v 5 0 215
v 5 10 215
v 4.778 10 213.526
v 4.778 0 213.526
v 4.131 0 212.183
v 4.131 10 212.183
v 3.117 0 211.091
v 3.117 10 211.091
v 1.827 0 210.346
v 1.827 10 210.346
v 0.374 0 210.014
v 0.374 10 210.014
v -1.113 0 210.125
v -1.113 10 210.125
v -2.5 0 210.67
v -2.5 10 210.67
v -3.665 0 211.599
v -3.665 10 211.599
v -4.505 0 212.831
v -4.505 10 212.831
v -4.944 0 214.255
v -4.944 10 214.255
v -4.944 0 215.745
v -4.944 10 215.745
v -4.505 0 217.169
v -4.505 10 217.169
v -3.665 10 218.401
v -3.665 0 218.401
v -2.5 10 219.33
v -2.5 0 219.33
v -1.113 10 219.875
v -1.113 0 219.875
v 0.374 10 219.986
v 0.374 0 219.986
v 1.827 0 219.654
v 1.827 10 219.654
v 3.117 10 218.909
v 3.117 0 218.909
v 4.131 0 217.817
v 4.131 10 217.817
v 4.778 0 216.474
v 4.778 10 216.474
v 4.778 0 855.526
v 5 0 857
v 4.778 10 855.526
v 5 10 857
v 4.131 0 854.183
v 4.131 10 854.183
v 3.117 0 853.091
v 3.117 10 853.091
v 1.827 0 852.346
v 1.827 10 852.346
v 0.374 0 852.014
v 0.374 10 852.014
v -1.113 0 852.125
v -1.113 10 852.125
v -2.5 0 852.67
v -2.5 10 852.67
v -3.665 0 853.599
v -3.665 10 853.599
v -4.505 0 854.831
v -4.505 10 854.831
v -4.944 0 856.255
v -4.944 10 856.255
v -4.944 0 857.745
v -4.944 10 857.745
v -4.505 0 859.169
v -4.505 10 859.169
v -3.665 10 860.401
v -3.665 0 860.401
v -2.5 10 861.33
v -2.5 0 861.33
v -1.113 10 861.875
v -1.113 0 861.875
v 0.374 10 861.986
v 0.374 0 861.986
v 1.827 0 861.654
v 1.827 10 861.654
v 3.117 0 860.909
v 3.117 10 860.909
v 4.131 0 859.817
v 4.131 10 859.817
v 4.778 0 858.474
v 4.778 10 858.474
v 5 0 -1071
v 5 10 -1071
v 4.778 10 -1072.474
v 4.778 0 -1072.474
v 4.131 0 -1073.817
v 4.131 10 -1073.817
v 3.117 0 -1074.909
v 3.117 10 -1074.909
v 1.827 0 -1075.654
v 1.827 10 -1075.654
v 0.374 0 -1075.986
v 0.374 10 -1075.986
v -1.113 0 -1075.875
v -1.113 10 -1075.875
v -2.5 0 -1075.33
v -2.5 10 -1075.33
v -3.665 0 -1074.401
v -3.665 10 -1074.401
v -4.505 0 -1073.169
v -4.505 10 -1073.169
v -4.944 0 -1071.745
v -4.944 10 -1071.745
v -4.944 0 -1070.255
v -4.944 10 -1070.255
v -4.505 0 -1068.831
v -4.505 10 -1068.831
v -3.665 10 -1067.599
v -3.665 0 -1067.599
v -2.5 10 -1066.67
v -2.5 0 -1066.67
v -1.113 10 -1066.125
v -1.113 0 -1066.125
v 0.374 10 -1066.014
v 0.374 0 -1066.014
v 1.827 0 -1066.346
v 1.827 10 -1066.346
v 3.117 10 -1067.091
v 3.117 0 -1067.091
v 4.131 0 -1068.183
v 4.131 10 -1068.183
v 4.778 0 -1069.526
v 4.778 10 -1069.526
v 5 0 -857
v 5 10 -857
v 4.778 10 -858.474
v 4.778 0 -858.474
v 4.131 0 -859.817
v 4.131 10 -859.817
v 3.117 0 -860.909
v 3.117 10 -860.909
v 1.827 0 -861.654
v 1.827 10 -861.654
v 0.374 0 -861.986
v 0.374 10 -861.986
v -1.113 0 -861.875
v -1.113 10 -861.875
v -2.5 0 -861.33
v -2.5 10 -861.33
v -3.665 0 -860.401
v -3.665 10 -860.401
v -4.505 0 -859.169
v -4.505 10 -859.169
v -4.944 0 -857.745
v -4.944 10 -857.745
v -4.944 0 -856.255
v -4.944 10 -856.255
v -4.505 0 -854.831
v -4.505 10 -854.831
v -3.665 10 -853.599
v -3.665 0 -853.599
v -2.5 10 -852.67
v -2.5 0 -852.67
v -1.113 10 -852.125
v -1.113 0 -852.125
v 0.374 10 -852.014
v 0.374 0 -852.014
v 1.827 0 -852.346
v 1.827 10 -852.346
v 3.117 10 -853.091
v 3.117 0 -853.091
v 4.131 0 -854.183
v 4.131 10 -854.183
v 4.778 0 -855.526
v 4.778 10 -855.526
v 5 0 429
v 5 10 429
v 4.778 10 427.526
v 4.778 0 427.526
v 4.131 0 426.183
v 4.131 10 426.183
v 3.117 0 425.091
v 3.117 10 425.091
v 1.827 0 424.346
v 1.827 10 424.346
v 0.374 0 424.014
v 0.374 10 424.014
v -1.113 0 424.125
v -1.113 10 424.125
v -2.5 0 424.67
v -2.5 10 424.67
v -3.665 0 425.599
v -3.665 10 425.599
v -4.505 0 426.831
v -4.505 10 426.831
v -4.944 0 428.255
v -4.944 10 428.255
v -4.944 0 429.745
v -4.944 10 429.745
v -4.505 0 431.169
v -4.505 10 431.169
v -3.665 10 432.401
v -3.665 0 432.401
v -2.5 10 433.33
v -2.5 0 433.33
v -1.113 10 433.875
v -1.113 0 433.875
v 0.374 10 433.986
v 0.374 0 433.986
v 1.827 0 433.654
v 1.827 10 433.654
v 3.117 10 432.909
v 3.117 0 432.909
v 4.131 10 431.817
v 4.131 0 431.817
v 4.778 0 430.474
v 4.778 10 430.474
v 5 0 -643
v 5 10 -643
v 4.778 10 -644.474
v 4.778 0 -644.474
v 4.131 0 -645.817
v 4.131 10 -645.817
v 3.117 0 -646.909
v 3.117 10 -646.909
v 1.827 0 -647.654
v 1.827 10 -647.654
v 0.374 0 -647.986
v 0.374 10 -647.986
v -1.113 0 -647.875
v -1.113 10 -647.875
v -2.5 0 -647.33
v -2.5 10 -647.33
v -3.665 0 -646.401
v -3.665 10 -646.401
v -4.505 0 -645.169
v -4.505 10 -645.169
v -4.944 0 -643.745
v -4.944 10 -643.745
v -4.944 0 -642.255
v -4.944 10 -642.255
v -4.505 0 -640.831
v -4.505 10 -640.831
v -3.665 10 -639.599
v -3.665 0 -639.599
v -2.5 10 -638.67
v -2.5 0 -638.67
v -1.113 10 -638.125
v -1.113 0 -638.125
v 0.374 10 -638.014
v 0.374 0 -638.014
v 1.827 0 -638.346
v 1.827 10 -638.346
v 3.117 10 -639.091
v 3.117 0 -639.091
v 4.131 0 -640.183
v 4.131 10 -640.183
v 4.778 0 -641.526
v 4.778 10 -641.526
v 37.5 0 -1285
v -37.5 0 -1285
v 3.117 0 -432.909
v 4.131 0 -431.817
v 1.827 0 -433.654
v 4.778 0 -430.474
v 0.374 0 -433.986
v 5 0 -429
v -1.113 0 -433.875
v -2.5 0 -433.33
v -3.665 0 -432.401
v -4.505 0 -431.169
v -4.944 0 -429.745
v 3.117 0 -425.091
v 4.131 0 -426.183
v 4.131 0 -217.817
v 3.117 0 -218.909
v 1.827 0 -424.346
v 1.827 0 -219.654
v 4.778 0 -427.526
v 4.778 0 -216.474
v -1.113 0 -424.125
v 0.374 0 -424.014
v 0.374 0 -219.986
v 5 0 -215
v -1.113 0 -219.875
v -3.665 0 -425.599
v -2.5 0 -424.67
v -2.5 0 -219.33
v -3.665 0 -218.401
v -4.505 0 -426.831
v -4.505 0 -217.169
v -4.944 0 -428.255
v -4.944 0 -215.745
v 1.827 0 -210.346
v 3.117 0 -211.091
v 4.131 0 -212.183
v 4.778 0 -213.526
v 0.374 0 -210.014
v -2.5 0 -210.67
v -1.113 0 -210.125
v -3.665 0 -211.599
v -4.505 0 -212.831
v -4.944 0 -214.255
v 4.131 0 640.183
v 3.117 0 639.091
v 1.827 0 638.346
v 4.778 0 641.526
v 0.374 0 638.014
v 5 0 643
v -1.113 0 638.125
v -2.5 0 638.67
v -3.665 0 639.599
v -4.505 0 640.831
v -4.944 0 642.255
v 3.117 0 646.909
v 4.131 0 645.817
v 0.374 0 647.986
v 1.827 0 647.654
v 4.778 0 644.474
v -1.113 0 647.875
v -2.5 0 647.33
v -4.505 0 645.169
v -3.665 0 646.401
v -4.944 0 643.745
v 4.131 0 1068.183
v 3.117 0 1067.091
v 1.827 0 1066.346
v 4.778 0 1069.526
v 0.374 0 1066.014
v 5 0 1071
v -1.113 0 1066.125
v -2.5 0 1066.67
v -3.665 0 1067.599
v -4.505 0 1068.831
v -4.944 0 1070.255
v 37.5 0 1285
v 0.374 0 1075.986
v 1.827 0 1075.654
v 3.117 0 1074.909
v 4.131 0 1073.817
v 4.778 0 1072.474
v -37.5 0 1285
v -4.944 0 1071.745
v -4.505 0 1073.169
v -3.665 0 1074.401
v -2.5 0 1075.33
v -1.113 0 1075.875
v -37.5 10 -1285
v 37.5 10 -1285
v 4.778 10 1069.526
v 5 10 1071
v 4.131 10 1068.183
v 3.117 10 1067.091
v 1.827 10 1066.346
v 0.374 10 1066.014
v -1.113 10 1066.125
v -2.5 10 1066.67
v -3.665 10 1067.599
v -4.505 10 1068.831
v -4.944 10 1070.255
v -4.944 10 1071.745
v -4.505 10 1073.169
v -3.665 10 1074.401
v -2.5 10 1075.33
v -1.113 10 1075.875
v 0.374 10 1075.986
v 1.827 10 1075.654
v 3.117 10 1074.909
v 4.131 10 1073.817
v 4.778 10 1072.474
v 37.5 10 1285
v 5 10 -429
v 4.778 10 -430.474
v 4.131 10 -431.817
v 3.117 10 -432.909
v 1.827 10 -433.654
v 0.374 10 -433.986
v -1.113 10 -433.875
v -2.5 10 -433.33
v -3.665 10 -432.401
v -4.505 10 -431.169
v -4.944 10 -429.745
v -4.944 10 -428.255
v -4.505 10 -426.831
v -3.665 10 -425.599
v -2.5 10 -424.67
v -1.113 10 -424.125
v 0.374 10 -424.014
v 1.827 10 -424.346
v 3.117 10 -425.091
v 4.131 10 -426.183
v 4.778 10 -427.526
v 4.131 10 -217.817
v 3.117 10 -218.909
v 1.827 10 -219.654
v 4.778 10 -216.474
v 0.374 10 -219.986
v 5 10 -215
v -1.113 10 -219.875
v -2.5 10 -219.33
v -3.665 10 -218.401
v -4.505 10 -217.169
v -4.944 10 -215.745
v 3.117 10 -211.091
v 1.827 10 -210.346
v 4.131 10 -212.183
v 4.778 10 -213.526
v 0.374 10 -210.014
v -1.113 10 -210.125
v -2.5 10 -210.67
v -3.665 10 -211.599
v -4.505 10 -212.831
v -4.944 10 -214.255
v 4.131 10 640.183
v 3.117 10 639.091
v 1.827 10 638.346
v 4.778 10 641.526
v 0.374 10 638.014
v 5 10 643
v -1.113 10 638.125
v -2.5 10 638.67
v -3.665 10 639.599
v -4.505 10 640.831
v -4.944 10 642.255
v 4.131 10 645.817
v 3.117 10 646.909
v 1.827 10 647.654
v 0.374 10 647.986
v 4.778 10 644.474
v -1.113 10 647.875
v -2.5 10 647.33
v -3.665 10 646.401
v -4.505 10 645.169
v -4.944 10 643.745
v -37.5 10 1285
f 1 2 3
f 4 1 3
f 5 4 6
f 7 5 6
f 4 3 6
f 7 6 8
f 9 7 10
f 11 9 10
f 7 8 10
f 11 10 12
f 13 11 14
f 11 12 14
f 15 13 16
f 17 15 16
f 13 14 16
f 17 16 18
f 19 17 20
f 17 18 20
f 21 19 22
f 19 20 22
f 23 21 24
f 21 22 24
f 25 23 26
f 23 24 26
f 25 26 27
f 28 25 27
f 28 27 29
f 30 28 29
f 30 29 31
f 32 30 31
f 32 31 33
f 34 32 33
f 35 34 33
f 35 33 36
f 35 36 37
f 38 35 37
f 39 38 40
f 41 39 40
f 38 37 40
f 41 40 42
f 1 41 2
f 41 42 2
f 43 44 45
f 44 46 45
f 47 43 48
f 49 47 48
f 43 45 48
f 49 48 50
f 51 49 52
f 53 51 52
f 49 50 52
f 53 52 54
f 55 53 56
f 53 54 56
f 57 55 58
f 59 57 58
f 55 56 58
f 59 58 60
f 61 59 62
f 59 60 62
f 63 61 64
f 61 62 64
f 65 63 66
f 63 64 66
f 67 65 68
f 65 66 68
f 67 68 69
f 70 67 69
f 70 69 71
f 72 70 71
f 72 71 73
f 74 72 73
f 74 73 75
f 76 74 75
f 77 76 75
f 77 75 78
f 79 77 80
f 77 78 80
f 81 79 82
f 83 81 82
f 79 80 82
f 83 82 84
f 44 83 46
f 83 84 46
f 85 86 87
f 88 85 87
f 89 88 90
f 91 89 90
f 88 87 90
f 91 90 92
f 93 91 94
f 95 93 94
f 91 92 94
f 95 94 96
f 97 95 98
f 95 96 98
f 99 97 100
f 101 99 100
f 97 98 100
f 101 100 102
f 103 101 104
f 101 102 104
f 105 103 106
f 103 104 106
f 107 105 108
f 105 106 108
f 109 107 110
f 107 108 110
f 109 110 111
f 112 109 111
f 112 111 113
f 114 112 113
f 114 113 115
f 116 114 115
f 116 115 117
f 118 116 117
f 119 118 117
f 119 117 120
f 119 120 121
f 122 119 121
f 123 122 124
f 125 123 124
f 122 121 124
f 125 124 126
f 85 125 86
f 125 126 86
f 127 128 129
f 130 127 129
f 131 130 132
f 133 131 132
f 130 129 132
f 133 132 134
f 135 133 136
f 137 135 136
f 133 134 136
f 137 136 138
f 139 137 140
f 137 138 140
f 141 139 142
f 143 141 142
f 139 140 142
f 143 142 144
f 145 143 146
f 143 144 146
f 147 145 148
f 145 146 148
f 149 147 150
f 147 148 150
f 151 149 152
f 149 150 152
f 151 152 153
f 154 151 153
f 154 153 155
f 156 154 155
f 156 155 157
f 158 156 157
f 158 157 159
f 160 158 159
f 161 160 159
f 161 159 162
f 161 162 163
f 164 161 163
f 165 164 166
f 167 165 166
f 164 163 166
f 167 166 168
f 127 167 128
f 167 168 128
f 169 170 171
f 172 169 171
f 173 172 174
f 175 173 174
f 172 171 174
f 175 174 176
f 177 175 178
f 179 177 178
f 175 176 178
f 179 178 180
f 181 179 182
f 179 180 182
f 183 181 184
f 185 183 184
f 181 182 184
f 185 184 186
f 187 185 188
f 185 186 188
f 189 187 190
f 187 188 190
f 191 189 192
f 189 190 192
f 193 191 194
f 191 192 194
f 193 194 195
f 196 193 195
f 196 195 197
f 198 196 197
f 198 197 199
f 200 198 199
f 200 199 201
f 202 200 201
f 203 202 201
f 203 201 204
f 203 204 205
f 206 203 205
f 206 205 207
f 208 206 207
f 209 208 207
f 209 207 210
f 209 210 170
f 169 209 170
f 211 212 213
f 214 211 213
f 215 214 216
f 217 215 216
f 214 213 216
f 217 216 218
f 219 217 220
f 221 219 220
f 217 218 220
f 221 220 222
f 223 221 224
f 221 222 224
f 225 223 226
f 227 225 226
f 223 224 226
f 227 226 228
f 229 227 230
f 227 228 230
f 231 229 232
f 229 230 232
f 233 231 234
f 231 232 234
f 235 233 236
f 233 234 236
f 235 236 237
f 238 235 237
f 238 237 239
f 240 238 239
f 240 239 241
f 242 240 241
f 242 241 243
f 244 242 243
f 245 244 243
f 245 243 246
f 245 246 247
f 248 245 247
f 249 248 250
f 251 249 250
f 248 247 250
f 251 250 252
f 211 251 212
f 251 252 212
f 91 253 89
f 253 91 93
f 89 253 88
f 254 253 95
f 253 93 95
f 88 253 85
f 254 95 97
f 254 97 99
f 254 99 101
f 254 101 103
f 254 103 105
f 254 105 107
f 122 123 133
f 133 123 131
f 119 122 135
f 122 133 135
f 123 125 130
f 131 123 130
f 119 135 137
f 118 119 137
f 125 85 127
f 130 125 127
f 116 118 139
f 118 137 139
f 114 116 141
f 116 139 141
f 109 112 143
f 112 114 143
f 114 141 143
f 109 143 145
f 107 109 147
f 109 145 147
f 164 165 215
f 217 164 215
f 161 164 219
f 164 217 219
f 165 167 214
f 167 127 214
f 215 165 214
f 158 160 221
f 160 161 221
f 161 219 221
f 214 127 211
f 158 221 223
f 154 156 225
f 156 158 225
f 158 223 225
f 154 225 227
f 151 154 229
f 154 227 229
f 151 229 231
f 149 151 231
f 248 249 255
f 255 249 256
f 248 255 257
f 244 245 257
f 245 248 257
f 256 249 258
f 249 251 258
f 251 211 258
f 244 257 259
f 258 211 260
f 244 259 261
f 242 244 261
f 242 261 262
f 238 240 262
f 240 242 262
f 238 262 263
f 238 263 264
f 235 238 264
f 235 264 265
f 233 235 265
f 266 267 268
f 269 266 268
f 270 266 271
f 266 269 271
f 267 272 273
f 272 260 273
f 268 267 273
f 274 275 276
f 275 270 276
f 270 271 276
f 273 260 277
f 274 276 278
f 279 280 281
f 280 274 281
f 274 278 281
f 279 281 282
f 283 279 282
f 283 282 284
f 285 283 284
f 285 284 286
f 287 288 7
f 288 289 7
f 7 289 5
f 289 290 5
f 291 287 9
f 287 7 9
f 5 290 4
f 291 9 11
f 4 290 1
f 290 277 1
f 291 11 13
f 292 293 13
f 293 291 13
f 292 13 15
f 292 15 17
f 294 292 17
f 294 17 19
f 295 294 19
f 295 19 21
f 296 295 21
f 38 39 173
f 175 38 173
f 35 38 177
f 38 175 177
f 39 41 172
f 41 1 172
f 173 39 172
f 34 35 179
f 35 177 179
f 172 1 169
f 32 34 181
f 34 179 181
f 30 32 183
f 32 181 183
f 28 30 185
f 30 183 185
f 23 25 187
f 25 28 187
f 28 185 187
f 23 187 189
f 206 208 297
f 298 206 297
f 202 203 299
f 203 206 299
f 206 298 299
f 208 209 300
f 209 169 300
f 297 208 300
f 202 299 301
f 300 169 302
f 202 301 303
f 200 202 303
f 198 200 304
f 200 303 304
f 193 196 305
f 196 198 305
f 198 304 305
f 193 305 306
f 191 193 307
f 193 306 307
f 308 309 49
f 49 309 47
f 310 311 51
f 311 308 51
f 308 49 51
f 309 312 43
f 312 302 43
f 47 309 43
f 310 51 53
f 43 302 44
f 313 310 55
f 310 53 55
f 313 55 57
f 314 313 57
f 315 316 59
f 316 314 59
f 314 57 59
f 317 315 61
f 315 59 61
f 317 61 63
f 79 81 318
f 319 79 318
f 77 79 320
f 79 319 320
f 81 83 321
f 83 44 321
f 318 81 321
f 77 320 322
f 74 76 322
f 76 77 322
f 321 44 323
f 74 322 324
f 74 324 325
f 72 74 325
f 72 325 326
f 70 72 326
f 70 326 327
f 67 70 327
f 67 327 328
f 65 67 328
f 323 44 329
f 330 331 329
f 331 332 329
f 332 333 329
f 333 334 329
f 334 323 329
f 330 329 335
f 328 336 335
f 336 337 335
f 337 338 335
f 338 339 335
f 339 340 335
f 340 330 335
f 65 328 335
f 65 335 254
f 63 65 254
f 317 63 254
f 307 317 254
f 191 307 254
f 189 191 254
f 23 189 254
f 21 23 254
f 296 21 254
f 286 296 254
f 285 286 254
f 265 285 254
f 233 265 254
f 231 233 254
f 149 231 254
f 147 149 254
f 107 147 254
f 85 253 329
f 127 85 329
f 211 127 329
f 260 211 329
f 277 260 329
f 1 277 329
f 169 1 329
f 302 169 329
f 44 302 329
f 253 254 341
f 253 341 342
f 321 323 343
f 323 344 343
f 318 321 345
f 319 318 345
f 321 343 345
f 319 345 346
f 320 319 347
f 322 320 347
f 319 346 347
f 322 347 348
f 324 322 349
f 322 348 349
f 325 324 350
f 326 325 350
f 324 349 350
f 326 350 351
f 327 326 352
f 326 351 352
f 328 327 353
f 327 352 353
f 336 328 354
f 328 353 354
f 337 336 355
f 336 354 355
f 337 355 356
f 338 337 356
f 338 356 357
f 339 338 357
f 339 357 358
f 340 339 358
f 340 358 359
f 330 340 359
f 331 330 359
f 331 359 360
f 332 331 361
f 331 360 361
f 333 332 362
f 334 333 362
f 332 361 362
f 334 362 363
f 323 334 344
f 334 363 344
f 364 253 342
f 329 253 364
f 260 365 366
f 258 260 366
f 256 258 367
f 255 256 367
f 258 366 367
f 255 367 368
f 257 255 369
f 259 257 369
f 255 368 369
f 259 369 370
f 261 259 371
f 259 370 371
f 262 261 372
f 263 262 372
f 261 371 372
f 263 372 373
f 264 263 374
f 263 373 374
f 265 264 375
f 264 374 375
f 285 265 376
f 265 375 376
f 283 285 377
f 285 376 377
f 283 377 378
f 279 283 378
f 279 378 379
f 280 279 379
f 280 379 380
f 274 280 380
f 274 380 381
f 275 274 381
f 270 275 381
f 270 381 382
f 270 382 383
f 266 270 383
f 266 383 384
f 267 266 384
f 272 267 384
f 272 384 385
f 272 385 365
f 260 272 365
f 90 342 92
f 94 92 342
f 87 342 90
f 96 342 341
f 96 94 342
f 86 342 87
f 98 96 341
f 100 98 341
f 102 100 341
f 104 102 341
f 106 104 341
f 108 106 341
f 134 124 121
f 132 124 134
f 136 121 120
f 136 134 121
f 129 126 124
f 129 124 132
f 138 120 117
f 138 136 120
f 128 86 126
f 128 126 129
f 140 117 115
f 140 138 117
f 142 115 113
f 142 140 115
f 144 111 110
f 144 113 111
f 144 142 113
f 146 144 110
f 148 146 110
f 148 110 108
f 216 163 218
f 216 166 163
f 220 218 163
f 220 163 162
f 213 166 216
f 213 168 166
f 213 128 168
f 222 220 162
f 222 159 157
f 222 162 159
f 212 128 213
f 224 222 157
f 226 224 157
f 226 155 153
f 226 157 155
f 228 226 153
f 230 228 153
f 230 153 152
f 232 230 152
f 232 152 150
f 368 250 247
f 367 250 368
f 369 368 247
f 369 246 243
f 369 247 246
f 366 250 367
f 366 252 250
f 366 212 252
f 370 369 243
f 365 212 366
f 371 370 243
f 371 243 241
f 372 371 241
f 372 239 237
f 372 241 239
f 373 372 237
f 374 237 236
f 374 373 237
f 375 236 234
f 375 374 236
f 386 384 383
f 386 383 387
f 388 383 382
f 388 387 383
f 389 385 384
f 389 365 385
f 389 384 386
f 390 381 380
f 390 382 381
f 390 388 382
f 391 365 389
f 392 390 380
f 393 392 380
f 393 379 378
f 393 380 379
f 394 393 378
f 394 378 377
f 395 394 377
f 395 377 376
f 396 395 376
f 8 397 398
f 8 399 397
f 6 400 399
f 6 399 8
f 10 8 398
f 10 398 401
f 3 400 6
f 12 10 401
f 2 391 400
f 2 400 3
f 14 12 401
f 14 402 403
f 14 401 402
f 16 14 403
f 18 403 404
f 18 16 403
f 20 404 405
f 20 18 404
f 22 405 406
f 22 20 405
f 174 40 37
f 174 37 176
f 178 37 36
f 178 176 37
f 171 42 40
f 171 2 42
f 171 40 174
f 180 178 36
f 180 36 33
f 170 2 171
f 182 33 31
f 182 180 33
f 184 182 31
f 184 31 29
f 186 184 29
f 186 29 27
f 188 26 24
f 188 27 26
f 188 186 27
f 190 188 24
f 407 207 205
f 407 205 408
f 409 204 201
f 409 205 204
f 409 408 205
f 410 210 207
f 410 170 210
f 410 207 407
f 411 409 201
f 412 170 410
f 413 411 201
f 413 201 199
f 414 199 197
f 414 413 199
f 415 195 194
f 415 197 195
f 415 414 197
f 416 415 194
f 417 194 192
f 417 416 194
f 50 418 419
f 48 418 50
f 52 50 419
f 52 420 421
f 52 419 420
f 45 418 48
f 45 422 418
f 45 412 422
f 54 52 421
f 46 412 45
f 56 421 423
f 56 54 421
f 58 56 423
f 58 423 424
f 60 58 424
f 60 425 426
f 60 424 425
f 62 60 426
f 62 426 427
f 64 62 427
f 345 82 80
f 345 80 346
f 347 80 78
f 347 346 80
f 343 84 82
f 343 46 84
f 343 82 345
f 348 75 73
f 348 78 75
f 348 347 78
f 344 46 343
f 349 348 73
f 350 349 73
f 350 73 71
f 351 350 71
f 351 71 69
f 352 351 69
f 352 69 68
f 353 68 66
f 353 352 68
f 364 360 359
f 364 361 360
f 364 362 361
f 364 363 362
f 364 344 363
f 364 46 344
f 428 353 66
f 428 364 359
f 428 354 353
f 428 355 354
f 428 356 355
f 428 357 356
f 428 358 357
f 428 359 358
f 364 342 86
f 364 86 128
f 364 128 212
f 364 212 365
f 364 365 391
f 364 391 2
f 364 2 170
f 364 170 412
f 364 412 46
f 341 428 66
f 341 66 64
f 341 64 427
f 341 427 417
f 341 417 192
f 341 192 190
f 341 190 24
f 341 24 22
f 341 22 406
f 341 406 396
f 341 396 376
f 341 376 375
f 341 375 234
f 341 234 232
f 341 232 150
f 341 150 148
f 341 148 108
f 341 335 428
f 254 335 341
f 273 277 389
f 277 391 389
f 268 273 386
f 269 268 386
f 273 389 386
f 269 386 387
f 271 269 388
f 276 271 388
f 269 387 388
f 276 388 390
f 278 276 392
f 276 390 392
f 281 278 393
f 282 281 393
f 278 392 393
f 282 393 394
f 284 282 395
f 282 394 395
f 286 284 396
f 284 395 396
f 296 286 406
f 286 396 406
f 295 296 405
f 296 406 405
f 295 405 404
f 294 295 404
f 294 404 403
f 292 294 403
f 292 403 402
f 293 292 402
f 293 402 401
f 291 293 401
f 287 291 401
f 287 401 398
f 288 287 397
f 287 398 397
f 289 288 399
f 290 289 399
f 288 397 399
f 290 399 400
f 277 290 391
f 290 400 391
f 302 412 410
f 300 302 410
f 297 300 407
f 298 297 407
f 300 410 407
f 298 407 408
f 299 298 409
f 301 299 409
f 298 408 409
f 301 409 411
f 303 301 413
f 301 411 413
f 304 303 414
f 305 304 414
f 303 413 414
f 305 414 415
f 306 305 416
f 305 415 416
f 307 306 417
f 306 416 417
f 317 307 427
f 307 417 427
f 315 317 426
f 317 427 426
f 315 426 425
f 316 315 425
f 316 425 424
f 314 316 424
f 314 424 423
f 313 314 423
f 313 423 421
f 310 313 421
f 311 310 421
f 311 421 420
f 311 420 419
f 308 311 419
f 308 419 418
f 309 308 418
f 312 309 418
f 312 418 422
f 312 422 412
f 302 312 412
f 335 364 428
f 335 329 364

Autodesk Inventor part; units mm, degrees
ref_plane "YZ Plane" through (0, 0, 0) normal (1, 0, 0) x (0, 1, 0)
ref_plane "XZ Plane" through (0, 0, 0) normal (0, 1, 0) x (-1, 0, 0)
ref_plane "XY Plane" through (0, 0, 0) normal (0, 0, 1) x (1, 0, 0)
sketch "Boceto1" plane through (0, 0, 0) normal (0, 1, 0) x (-1, 0, 0)
  line L0 (-37.5, -1285) -> (-37.5, 1285)
  line L1 (-37.5, 1285) -> (37.5, 1285)
  line L2 (37.5, 1285) -> (37.5, -1285)
  line L3 (37.5, -1285) -> (-37.5, -1285)
  line L4 (-37.5, -1285) -> (37.5, 1285) construction
  line L5 (-37.5, 1285) -> (37.5, -1285) construction
  point P0 (0, 0)
  dimension "d0" = 2570
  dimension "d1" = 75
extrude "Extrusión1" add sketch "Boceto1" along normal blind 10
sketch "Boceto2" plane through (0, 10, 0) normal (0, 1, 0) x (1, 0, 0)
  circle A0 centre (0, -1071) radius 5
  line L0 (20, -1285) -> (-20, -1285)
  circle A1 centre (0, -857) radius 5
  circle A2 centre (0, -643) radius 5
  circle A3 centre (0, -429) radius 5
  circle A4 centre (0, -215) radius 5
  line L1 (-157.4788, 0) -> (166.1246, 0)
  circle A5 centre (0, 1071) radius 5
  circle A6 centre (0, 857) radius 5
  circle A7 centre (0, 643) radius 5
  circle A8 centre (0, 429) radius 5
  circle A9 centre (0, 215) radius 5
  point P0 (0, 0)
  point P1 (0, 0)
  dimension "d4" = 10
  dimension "d5" = 214
  dimension "d6" = 10
  dimension "d7" = 214
  dimension "d8" = 10
  dimension "d9" = 214
  dimension "d10" = 10
  dimension "d11" = 214
  dimension "d12" = 10
  dimension "d13" = 214
  dimension "d14" = 215
extrude "Extrusión2" cut sketch "Boceto2" against normal blind 10
properties part number "2570 STEEL PLATE RAIL" material "Acero"
